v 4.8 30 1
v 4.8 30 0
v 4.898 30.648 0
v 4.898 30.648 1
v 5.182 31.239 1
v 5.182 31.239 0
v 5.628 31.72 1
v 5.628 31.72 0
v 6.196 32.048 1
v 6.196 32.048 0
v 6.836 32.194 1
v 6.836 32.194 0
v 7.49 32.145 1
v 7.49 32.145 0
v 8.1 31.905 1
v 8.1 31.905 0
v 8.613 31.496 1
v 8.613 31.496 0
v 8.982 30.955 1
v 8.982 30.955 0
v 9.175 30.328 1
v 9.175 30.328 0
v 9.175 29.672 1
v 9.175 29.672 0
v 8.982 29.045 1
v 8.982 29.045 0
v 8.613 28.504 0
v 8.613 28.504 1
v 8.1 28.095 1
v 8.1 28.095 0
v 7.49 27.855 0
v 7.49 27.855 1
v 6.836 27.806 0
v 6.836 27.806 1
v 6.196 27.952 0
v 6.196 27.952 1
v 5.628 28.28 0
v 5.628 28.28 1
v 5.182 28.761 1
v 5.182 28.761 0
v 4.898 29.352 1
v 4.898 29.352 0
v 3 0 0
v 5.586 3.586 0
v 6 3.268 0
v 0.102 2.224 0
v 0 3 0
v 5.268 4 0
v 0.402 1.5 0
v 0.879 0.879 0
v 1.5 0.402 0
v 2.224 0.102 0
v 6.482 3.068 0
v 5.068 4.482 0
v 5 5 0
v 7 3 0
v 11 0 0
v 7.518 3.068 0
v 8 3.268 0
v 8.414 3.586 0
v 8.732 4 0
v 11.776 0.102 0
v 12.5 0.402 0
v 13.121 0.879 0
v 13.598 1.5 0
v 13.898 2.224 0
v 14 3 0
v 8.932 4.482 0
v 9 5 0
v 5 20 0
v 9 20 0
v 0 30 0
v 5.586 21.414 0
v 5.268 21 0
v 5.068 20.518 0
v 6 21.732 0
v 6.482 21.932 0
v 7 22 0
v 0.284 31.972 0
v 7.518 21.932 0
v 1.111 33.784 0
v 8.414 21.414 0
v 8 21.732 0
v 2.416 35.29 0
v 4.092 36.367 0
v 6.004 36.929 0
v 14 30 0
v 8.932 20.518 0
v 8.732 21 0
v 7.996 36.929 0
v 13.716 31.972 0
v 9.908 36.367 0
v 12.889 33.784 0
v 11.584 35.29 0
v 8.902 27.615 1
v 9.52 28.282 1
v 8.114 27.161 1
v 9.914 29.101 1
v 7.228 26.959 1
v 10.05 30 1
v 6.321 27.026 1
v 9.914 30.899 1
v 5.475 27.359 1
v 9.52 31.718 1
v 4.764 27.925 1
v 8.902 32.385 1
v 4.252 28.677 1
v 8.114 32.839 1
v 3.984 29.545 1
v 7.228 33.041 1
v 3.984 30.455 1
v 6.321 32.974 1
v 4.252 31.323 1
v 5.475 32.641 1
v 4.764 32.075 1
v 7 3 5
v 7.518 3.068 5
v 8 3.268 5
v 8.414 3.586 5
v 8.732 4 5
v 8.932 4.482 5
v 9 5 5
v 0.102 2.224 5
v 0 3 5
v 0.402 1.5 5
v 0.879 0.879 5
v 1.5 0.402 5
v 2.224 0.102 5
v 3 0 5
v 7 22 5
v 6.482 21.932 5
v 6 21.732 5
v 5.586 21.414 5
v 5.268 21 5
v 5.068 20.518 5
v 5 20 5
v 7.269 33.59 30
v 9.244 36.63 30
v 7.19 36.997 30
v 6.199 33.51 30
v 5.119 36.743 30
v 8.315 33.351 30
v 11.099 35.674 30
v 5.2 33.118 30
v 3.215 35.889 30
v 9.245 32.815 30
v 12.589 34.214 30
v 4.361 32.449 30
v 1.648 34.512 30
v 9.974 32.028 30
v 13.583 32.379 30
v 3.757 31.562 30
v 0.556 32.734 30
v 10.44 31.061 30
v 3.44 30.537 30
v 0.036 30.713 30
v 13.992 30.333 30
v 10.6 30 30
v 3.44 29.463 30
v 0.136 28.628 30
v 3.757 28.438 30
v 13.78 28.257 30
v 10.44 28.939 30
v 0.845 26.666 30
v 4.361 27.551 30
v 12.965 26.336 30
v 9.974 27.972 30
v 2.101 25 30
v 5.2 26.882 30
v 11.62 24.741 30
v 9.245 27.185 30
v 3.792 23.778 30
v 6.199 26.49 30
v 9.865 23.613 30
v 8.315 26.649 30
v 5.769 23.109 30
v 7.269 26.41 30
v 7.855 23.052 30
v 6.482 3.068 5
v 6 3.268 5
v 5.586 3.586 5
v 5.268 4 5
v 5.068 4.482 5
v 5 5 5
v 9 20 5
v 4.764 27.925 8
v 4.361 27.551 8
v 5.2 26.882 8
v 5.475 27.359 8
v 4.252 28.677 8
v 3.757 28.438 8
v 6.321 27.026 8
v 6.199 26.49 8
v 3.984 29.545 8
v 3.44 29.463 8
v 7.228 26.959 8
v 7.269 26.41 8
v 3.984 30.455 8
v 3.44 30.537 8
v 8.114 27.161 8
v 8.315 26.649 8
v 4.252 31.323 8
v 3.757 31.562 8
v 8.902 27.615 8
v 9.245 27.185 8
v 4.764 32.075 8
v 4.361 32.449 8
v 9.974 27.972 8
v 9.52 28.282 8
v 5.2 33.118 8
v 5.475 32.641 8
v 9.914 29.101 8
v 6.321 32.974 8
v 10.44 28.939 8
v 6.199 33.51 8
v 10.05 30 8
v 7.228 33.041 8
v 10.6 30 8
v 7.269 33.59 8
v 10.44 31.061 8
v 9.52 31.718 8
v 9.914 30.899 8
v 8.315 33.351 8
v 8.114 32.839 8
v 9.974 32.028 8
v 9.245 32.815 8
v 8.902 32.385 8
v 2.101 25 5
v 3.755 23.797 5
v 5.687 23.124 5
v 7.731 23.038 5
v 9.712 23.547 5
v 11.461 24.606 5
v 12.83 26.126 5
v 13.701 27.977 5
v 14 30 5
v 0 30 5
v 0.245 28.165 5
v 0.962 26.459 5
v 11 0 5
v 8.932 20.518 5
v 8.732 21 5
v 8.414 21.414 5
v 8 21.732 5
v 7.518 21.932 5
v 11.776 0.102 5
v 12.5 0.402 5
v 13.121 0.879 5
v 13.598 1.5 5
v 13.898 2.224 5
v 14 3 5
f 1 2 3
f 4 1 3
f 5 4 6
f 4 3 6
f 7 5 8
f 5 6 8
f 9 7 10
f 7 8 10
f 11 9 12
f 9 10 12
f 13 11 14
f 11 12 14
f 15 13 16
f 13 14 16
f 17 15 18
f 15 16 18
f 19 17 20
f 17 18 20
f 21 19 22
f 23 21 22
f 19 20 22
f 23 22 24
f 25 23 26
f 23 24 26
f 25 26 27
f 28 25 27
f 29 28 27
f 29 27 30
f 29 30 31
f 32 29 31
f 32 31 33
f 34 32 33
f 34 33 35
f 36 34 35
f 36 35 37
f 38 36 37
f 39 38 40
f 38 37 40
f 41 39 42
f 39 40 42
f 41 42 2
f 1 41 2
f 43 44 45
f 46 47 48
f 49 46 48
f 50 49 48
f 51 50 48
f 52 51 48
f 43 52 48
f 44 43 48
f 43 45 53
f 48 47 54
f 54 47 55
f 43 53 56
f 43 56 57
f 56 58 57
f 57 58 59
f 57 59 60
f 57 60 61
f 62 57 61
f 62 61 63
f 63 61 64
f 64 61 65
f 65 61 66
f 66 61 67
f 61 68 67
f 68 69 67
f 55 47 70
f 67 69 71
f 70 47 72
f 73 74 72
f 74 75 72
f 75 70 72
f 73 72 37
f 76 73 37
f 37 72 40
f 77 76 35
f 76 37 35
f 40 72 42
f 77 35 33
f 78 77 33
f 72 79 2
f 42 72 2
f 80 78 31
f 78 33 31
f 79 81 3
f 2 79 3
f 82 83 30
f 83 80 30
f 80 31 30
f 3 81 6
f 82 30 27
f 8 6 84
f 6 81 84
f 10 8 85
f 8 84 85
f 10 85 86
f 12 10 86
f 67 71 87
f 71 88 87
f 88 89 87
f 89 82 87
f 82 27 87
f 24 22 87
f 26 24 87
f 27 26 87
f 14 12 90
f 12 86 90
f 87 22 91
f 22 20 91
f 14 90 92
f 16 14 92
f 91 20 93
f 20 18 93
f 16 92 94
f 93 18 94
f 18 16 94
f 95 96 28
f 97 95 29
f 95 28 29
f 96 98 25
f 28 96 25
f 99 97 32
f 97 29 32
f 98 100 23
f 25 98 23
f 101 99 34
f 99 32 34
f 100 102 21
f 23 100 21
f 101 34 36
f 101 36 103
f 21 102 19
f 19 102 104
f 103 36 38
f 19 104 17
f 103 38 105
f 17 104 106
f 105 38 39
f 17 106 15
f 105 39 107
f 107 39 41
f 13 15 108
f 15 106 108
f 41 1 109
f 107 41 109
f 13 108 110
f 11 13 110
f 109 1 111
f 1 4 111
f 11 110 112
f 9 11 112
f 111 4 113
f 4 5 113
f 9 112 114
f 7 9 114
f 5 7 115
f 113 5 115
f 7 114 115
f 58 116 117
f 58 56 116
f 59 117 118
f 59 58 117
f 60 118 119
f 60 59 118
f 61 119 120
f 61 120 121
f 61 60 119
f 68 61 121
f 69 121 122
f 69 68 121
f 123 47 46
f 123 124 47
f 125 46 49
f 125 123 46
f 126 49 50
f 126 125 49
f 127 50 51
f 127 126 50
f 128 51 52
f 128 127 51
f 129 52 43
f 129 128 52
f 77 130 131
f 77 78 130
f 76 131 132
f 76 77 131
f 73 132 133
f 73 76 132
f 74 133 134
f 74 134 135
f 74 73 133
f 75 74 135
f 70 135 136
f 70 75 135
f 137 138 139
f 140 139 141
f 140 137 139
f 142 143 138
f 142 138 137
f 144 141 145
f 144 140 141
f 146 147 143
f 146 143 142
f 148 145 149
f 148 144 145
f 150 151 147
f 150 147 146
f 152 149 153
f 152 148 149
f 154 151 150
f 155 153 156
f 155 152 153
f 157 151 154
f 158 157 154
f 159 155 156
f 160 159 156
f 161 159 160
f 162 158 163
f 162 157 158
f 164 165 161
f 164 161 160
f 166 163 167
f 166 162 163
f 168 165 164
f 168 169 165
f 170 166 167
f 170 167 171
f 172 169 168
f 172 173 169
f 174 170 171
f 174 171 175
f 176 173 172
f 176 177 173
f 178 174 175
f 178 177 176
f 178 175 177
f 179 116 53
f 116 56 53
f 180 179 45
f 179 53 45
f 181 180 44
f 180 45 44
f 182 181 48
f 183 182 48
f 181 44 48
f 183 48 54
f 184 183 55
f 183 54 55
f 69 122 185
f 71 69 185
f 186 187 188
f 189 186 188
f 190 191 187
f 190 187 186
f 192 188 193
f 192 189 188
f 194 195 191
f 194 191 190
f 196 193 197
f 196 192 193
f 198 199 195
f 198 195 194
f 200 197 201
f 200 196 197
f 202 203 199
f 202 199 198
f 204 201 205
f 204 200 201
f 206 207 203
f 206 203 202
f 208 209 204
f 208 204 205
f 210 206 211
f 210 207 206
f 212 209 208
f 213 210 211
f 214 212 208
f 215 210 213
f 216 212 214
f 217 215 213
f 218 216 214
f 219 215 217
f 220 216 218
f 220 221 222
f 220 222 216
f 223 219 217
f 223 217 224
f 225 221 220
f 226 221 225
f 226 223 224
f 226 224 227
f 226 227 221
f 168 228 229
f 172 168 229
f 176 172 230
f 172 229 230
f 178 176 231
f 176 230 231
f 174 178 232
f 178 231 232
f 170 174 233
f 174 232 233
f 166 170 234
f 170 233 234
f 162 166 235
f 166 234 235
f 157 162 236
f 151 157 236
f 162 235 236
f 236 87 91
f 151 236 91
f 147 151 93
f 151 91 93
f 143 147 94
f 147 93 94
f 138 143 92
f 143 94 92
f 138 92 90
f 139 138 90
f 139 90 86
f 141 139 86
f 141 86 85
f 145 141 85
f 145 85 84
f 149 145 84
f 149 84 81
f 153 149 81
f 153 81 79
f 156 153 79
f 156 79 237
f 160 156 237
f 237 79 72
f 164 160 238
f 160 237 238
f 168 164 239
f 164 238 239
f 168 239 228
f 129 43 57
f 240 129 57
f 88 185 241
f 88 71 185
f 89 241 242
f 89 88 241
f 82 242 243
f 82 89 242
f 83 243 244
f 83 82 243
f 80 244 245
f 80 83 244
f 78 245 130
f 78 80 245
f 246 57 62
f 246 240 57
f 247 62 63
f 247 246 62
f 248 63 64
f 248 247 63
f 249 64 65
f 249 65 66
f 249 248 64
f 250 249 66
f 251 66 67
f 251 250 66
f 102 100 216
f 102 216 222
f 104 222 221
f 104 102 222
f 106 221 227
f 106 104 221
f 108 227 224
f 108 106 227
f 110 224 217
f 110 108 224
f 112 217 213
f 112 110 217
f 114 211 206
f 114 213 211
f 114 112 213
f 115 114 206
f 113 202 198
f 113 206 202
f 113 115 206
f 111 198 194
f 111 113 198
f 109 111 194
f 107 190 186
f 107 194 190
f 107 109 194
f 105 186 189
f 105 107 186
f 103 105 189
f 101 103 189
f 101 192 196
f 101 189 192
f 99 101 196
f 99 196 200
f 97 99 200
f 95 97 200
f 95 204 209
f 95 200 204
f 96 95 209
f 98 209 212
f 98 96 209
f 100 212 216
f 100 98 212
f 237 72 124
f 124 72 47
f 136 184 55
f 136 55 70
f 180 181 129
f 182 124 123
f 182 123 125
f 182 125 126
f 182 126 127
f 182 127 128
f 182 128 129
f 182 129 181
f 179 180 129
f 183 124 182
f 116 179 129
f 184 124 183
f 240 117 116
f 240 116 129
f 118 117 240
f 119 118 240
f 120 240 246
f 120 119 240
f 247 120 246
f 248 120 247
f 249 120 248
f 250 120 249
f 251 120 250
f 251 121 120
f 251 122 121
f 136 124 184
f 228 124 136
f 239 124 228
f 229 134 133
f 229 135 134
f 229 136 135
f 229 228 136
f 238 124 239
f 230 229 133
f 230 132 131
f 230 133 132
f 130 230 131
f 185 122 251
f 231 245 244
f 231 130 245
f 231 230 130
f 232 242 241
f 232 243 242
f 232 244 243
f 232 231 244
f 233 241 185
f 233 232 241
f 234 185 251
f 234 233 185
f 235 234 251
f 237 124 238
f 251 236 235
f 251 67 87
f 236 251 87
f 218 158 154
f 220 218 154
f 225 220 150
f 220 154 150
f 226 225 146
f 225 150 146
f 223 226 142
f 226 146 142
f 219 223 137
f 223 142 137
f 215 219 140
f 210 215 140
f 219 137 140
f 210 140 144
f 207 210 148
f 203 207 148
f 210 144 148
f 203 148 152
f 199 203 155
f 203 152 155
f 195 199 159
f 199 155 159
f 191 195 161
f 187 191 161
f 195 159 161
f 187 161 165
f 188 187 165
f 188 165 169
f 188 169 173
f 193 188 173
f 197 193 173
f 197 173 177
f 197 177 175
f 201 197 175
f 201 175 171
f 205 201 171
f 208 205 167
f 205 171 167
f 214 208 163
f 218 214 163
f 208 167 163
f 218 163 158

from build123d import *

# Parameters (mm, degrees)
SZKIC1_W                    = 14
SZKIC1_H                    = 25
DODANIE_WYCI_GNI_CIE1_DEPTH = 5
SZKIC2_W                    = 4
SZKIC2_H                    = 19
WYTNIJ_WYCI_GNI_CIE1_DEPTH  = 5
ZAOKR_GLENIE1_R             = 2
ZAOKR_GLENIE2_R             = 3
SZKIC3_R                    = 7
SZKIC3_R_2                  = 3.05
DODANIE_WYCI_GNI_CIE2_DEPTH = 30
DODANIE_WYCI_GNI_CIE3_DEPTH = 5
SZKIC5_R                    = 5
SZKIC5_R_2                  = 2.2
DODANIE_WYCI_GNI_CIE4_DEPTH = 1
SZKIC6_R                    = 3.6
WYTNIJ_WYCI_GNI_CIE2_DEPTH  = 22


with BuildPart() as part:
    # Szkic1 → Dodanie-wyciągnięcie1 (new body)
    with BuildSketch(Plane.XY):
        with Locations((7, 12.5)):
            Rectangle(SZKIC1_W, SZKIC1_H)
    extrude(amount=DODANIE_WYCI_GNI_CIE1_DEPTH)

    # Szkic2 → Wytnij-wyciągnięcie1 (cut)
    with BuildSketch(Plane.XY.offset(5)):
        with Locations((7, 12.5)):
            Rectangle(SZKIC2_W, SZKIC2_H)
    extrude(amount=-WYTNIJ_WYCI_GNI_CIE1_DEPTH, mode=Mode.SUBTRACT)

    # Zaokrąglenie1
    zaokr_glenie1_edges = [part.edges().sort_by_distance(p)[0] for p in [
        (5, 3, 2.5),
        (9, 3, 2.5),
        (9, 22, 2.5),
        (5, 22, 2.5),
    ]]
    fillet(zaokr_glenie1_edges, radius=ZAOKR_GLENIE1_R - 0.0001)  # a hair under: the kernel refuses the full size

    # Zaokrąglenie2
    zaokr_glenie2_edges = [part.edges().sort_by_distance(p)[0] for p in [
        (14, 0, 2.5),
        (0, 0, 2.5),
    ]]
    fillet(zaokr_glenie2_edges, radius=ZAOKR_GLENIE2_R)

    # Szkic3 → Dodanie-wyciągnięcie2 (add)
    with BuildSketch(Plane.XY):
        with Locations(Location((7, 30, 0), (0, 0, 225.584691403))):
            Circle(SZKIC3_R)
        with Locations((7, 30)):
            Circle(SZKIC3_R_2, mode=Mode.SUBTRACT)
    extrude(amount=DODANIE_WYCI_GNI_CIE2_DEPTH)

    # Szkic4 → Dodanie-wyciągnięcie3 (add)
    with BuildSketch(Plane(origin=(0, 0, 0), x_dir=(-1, 0, 0), z_dir=(0, 0, -1))):
        Polygon((-14, 25), (-14, 30), (-11.004847048, 25), align=None)
        Polygon((-2.101020514, 25), (0, 30), (0, 25), align=None)
    extrude(amount=-DODANIE_WYCI_GNI_CIE3_DEPTH)

    # Szkic5 → Dodanie-wyciągnięcie4 (add)
    with BuildSketch(Plane(origin=(0, 0, 0), x_dir=(-1, 0, 0), z_dir=(0, 0, -1))):
        with Locations((-7, 30)):
            Circle(SZKIC5_R)
        with Locations((-7, 30)):
            Circle(SZKIC5_R_2, mode=Mode.SUBTRACT)
    extrude(amount=-DODANIE_WYCI_GNI_CIE4_DEPTH)

    # Szkic6 → Wytnij-wyciągnięcie2 (cut)
    with BuildSketch(Plane.XY.offset(30)):
        with Locations((7, 30)):
            Circle(SZKIC6_R)
    extrude(amount=-WYTNIJ_WYCI_GNI_CIE2_DEPTH, mode=Mode.SUBTRACT)


solid = part.part
